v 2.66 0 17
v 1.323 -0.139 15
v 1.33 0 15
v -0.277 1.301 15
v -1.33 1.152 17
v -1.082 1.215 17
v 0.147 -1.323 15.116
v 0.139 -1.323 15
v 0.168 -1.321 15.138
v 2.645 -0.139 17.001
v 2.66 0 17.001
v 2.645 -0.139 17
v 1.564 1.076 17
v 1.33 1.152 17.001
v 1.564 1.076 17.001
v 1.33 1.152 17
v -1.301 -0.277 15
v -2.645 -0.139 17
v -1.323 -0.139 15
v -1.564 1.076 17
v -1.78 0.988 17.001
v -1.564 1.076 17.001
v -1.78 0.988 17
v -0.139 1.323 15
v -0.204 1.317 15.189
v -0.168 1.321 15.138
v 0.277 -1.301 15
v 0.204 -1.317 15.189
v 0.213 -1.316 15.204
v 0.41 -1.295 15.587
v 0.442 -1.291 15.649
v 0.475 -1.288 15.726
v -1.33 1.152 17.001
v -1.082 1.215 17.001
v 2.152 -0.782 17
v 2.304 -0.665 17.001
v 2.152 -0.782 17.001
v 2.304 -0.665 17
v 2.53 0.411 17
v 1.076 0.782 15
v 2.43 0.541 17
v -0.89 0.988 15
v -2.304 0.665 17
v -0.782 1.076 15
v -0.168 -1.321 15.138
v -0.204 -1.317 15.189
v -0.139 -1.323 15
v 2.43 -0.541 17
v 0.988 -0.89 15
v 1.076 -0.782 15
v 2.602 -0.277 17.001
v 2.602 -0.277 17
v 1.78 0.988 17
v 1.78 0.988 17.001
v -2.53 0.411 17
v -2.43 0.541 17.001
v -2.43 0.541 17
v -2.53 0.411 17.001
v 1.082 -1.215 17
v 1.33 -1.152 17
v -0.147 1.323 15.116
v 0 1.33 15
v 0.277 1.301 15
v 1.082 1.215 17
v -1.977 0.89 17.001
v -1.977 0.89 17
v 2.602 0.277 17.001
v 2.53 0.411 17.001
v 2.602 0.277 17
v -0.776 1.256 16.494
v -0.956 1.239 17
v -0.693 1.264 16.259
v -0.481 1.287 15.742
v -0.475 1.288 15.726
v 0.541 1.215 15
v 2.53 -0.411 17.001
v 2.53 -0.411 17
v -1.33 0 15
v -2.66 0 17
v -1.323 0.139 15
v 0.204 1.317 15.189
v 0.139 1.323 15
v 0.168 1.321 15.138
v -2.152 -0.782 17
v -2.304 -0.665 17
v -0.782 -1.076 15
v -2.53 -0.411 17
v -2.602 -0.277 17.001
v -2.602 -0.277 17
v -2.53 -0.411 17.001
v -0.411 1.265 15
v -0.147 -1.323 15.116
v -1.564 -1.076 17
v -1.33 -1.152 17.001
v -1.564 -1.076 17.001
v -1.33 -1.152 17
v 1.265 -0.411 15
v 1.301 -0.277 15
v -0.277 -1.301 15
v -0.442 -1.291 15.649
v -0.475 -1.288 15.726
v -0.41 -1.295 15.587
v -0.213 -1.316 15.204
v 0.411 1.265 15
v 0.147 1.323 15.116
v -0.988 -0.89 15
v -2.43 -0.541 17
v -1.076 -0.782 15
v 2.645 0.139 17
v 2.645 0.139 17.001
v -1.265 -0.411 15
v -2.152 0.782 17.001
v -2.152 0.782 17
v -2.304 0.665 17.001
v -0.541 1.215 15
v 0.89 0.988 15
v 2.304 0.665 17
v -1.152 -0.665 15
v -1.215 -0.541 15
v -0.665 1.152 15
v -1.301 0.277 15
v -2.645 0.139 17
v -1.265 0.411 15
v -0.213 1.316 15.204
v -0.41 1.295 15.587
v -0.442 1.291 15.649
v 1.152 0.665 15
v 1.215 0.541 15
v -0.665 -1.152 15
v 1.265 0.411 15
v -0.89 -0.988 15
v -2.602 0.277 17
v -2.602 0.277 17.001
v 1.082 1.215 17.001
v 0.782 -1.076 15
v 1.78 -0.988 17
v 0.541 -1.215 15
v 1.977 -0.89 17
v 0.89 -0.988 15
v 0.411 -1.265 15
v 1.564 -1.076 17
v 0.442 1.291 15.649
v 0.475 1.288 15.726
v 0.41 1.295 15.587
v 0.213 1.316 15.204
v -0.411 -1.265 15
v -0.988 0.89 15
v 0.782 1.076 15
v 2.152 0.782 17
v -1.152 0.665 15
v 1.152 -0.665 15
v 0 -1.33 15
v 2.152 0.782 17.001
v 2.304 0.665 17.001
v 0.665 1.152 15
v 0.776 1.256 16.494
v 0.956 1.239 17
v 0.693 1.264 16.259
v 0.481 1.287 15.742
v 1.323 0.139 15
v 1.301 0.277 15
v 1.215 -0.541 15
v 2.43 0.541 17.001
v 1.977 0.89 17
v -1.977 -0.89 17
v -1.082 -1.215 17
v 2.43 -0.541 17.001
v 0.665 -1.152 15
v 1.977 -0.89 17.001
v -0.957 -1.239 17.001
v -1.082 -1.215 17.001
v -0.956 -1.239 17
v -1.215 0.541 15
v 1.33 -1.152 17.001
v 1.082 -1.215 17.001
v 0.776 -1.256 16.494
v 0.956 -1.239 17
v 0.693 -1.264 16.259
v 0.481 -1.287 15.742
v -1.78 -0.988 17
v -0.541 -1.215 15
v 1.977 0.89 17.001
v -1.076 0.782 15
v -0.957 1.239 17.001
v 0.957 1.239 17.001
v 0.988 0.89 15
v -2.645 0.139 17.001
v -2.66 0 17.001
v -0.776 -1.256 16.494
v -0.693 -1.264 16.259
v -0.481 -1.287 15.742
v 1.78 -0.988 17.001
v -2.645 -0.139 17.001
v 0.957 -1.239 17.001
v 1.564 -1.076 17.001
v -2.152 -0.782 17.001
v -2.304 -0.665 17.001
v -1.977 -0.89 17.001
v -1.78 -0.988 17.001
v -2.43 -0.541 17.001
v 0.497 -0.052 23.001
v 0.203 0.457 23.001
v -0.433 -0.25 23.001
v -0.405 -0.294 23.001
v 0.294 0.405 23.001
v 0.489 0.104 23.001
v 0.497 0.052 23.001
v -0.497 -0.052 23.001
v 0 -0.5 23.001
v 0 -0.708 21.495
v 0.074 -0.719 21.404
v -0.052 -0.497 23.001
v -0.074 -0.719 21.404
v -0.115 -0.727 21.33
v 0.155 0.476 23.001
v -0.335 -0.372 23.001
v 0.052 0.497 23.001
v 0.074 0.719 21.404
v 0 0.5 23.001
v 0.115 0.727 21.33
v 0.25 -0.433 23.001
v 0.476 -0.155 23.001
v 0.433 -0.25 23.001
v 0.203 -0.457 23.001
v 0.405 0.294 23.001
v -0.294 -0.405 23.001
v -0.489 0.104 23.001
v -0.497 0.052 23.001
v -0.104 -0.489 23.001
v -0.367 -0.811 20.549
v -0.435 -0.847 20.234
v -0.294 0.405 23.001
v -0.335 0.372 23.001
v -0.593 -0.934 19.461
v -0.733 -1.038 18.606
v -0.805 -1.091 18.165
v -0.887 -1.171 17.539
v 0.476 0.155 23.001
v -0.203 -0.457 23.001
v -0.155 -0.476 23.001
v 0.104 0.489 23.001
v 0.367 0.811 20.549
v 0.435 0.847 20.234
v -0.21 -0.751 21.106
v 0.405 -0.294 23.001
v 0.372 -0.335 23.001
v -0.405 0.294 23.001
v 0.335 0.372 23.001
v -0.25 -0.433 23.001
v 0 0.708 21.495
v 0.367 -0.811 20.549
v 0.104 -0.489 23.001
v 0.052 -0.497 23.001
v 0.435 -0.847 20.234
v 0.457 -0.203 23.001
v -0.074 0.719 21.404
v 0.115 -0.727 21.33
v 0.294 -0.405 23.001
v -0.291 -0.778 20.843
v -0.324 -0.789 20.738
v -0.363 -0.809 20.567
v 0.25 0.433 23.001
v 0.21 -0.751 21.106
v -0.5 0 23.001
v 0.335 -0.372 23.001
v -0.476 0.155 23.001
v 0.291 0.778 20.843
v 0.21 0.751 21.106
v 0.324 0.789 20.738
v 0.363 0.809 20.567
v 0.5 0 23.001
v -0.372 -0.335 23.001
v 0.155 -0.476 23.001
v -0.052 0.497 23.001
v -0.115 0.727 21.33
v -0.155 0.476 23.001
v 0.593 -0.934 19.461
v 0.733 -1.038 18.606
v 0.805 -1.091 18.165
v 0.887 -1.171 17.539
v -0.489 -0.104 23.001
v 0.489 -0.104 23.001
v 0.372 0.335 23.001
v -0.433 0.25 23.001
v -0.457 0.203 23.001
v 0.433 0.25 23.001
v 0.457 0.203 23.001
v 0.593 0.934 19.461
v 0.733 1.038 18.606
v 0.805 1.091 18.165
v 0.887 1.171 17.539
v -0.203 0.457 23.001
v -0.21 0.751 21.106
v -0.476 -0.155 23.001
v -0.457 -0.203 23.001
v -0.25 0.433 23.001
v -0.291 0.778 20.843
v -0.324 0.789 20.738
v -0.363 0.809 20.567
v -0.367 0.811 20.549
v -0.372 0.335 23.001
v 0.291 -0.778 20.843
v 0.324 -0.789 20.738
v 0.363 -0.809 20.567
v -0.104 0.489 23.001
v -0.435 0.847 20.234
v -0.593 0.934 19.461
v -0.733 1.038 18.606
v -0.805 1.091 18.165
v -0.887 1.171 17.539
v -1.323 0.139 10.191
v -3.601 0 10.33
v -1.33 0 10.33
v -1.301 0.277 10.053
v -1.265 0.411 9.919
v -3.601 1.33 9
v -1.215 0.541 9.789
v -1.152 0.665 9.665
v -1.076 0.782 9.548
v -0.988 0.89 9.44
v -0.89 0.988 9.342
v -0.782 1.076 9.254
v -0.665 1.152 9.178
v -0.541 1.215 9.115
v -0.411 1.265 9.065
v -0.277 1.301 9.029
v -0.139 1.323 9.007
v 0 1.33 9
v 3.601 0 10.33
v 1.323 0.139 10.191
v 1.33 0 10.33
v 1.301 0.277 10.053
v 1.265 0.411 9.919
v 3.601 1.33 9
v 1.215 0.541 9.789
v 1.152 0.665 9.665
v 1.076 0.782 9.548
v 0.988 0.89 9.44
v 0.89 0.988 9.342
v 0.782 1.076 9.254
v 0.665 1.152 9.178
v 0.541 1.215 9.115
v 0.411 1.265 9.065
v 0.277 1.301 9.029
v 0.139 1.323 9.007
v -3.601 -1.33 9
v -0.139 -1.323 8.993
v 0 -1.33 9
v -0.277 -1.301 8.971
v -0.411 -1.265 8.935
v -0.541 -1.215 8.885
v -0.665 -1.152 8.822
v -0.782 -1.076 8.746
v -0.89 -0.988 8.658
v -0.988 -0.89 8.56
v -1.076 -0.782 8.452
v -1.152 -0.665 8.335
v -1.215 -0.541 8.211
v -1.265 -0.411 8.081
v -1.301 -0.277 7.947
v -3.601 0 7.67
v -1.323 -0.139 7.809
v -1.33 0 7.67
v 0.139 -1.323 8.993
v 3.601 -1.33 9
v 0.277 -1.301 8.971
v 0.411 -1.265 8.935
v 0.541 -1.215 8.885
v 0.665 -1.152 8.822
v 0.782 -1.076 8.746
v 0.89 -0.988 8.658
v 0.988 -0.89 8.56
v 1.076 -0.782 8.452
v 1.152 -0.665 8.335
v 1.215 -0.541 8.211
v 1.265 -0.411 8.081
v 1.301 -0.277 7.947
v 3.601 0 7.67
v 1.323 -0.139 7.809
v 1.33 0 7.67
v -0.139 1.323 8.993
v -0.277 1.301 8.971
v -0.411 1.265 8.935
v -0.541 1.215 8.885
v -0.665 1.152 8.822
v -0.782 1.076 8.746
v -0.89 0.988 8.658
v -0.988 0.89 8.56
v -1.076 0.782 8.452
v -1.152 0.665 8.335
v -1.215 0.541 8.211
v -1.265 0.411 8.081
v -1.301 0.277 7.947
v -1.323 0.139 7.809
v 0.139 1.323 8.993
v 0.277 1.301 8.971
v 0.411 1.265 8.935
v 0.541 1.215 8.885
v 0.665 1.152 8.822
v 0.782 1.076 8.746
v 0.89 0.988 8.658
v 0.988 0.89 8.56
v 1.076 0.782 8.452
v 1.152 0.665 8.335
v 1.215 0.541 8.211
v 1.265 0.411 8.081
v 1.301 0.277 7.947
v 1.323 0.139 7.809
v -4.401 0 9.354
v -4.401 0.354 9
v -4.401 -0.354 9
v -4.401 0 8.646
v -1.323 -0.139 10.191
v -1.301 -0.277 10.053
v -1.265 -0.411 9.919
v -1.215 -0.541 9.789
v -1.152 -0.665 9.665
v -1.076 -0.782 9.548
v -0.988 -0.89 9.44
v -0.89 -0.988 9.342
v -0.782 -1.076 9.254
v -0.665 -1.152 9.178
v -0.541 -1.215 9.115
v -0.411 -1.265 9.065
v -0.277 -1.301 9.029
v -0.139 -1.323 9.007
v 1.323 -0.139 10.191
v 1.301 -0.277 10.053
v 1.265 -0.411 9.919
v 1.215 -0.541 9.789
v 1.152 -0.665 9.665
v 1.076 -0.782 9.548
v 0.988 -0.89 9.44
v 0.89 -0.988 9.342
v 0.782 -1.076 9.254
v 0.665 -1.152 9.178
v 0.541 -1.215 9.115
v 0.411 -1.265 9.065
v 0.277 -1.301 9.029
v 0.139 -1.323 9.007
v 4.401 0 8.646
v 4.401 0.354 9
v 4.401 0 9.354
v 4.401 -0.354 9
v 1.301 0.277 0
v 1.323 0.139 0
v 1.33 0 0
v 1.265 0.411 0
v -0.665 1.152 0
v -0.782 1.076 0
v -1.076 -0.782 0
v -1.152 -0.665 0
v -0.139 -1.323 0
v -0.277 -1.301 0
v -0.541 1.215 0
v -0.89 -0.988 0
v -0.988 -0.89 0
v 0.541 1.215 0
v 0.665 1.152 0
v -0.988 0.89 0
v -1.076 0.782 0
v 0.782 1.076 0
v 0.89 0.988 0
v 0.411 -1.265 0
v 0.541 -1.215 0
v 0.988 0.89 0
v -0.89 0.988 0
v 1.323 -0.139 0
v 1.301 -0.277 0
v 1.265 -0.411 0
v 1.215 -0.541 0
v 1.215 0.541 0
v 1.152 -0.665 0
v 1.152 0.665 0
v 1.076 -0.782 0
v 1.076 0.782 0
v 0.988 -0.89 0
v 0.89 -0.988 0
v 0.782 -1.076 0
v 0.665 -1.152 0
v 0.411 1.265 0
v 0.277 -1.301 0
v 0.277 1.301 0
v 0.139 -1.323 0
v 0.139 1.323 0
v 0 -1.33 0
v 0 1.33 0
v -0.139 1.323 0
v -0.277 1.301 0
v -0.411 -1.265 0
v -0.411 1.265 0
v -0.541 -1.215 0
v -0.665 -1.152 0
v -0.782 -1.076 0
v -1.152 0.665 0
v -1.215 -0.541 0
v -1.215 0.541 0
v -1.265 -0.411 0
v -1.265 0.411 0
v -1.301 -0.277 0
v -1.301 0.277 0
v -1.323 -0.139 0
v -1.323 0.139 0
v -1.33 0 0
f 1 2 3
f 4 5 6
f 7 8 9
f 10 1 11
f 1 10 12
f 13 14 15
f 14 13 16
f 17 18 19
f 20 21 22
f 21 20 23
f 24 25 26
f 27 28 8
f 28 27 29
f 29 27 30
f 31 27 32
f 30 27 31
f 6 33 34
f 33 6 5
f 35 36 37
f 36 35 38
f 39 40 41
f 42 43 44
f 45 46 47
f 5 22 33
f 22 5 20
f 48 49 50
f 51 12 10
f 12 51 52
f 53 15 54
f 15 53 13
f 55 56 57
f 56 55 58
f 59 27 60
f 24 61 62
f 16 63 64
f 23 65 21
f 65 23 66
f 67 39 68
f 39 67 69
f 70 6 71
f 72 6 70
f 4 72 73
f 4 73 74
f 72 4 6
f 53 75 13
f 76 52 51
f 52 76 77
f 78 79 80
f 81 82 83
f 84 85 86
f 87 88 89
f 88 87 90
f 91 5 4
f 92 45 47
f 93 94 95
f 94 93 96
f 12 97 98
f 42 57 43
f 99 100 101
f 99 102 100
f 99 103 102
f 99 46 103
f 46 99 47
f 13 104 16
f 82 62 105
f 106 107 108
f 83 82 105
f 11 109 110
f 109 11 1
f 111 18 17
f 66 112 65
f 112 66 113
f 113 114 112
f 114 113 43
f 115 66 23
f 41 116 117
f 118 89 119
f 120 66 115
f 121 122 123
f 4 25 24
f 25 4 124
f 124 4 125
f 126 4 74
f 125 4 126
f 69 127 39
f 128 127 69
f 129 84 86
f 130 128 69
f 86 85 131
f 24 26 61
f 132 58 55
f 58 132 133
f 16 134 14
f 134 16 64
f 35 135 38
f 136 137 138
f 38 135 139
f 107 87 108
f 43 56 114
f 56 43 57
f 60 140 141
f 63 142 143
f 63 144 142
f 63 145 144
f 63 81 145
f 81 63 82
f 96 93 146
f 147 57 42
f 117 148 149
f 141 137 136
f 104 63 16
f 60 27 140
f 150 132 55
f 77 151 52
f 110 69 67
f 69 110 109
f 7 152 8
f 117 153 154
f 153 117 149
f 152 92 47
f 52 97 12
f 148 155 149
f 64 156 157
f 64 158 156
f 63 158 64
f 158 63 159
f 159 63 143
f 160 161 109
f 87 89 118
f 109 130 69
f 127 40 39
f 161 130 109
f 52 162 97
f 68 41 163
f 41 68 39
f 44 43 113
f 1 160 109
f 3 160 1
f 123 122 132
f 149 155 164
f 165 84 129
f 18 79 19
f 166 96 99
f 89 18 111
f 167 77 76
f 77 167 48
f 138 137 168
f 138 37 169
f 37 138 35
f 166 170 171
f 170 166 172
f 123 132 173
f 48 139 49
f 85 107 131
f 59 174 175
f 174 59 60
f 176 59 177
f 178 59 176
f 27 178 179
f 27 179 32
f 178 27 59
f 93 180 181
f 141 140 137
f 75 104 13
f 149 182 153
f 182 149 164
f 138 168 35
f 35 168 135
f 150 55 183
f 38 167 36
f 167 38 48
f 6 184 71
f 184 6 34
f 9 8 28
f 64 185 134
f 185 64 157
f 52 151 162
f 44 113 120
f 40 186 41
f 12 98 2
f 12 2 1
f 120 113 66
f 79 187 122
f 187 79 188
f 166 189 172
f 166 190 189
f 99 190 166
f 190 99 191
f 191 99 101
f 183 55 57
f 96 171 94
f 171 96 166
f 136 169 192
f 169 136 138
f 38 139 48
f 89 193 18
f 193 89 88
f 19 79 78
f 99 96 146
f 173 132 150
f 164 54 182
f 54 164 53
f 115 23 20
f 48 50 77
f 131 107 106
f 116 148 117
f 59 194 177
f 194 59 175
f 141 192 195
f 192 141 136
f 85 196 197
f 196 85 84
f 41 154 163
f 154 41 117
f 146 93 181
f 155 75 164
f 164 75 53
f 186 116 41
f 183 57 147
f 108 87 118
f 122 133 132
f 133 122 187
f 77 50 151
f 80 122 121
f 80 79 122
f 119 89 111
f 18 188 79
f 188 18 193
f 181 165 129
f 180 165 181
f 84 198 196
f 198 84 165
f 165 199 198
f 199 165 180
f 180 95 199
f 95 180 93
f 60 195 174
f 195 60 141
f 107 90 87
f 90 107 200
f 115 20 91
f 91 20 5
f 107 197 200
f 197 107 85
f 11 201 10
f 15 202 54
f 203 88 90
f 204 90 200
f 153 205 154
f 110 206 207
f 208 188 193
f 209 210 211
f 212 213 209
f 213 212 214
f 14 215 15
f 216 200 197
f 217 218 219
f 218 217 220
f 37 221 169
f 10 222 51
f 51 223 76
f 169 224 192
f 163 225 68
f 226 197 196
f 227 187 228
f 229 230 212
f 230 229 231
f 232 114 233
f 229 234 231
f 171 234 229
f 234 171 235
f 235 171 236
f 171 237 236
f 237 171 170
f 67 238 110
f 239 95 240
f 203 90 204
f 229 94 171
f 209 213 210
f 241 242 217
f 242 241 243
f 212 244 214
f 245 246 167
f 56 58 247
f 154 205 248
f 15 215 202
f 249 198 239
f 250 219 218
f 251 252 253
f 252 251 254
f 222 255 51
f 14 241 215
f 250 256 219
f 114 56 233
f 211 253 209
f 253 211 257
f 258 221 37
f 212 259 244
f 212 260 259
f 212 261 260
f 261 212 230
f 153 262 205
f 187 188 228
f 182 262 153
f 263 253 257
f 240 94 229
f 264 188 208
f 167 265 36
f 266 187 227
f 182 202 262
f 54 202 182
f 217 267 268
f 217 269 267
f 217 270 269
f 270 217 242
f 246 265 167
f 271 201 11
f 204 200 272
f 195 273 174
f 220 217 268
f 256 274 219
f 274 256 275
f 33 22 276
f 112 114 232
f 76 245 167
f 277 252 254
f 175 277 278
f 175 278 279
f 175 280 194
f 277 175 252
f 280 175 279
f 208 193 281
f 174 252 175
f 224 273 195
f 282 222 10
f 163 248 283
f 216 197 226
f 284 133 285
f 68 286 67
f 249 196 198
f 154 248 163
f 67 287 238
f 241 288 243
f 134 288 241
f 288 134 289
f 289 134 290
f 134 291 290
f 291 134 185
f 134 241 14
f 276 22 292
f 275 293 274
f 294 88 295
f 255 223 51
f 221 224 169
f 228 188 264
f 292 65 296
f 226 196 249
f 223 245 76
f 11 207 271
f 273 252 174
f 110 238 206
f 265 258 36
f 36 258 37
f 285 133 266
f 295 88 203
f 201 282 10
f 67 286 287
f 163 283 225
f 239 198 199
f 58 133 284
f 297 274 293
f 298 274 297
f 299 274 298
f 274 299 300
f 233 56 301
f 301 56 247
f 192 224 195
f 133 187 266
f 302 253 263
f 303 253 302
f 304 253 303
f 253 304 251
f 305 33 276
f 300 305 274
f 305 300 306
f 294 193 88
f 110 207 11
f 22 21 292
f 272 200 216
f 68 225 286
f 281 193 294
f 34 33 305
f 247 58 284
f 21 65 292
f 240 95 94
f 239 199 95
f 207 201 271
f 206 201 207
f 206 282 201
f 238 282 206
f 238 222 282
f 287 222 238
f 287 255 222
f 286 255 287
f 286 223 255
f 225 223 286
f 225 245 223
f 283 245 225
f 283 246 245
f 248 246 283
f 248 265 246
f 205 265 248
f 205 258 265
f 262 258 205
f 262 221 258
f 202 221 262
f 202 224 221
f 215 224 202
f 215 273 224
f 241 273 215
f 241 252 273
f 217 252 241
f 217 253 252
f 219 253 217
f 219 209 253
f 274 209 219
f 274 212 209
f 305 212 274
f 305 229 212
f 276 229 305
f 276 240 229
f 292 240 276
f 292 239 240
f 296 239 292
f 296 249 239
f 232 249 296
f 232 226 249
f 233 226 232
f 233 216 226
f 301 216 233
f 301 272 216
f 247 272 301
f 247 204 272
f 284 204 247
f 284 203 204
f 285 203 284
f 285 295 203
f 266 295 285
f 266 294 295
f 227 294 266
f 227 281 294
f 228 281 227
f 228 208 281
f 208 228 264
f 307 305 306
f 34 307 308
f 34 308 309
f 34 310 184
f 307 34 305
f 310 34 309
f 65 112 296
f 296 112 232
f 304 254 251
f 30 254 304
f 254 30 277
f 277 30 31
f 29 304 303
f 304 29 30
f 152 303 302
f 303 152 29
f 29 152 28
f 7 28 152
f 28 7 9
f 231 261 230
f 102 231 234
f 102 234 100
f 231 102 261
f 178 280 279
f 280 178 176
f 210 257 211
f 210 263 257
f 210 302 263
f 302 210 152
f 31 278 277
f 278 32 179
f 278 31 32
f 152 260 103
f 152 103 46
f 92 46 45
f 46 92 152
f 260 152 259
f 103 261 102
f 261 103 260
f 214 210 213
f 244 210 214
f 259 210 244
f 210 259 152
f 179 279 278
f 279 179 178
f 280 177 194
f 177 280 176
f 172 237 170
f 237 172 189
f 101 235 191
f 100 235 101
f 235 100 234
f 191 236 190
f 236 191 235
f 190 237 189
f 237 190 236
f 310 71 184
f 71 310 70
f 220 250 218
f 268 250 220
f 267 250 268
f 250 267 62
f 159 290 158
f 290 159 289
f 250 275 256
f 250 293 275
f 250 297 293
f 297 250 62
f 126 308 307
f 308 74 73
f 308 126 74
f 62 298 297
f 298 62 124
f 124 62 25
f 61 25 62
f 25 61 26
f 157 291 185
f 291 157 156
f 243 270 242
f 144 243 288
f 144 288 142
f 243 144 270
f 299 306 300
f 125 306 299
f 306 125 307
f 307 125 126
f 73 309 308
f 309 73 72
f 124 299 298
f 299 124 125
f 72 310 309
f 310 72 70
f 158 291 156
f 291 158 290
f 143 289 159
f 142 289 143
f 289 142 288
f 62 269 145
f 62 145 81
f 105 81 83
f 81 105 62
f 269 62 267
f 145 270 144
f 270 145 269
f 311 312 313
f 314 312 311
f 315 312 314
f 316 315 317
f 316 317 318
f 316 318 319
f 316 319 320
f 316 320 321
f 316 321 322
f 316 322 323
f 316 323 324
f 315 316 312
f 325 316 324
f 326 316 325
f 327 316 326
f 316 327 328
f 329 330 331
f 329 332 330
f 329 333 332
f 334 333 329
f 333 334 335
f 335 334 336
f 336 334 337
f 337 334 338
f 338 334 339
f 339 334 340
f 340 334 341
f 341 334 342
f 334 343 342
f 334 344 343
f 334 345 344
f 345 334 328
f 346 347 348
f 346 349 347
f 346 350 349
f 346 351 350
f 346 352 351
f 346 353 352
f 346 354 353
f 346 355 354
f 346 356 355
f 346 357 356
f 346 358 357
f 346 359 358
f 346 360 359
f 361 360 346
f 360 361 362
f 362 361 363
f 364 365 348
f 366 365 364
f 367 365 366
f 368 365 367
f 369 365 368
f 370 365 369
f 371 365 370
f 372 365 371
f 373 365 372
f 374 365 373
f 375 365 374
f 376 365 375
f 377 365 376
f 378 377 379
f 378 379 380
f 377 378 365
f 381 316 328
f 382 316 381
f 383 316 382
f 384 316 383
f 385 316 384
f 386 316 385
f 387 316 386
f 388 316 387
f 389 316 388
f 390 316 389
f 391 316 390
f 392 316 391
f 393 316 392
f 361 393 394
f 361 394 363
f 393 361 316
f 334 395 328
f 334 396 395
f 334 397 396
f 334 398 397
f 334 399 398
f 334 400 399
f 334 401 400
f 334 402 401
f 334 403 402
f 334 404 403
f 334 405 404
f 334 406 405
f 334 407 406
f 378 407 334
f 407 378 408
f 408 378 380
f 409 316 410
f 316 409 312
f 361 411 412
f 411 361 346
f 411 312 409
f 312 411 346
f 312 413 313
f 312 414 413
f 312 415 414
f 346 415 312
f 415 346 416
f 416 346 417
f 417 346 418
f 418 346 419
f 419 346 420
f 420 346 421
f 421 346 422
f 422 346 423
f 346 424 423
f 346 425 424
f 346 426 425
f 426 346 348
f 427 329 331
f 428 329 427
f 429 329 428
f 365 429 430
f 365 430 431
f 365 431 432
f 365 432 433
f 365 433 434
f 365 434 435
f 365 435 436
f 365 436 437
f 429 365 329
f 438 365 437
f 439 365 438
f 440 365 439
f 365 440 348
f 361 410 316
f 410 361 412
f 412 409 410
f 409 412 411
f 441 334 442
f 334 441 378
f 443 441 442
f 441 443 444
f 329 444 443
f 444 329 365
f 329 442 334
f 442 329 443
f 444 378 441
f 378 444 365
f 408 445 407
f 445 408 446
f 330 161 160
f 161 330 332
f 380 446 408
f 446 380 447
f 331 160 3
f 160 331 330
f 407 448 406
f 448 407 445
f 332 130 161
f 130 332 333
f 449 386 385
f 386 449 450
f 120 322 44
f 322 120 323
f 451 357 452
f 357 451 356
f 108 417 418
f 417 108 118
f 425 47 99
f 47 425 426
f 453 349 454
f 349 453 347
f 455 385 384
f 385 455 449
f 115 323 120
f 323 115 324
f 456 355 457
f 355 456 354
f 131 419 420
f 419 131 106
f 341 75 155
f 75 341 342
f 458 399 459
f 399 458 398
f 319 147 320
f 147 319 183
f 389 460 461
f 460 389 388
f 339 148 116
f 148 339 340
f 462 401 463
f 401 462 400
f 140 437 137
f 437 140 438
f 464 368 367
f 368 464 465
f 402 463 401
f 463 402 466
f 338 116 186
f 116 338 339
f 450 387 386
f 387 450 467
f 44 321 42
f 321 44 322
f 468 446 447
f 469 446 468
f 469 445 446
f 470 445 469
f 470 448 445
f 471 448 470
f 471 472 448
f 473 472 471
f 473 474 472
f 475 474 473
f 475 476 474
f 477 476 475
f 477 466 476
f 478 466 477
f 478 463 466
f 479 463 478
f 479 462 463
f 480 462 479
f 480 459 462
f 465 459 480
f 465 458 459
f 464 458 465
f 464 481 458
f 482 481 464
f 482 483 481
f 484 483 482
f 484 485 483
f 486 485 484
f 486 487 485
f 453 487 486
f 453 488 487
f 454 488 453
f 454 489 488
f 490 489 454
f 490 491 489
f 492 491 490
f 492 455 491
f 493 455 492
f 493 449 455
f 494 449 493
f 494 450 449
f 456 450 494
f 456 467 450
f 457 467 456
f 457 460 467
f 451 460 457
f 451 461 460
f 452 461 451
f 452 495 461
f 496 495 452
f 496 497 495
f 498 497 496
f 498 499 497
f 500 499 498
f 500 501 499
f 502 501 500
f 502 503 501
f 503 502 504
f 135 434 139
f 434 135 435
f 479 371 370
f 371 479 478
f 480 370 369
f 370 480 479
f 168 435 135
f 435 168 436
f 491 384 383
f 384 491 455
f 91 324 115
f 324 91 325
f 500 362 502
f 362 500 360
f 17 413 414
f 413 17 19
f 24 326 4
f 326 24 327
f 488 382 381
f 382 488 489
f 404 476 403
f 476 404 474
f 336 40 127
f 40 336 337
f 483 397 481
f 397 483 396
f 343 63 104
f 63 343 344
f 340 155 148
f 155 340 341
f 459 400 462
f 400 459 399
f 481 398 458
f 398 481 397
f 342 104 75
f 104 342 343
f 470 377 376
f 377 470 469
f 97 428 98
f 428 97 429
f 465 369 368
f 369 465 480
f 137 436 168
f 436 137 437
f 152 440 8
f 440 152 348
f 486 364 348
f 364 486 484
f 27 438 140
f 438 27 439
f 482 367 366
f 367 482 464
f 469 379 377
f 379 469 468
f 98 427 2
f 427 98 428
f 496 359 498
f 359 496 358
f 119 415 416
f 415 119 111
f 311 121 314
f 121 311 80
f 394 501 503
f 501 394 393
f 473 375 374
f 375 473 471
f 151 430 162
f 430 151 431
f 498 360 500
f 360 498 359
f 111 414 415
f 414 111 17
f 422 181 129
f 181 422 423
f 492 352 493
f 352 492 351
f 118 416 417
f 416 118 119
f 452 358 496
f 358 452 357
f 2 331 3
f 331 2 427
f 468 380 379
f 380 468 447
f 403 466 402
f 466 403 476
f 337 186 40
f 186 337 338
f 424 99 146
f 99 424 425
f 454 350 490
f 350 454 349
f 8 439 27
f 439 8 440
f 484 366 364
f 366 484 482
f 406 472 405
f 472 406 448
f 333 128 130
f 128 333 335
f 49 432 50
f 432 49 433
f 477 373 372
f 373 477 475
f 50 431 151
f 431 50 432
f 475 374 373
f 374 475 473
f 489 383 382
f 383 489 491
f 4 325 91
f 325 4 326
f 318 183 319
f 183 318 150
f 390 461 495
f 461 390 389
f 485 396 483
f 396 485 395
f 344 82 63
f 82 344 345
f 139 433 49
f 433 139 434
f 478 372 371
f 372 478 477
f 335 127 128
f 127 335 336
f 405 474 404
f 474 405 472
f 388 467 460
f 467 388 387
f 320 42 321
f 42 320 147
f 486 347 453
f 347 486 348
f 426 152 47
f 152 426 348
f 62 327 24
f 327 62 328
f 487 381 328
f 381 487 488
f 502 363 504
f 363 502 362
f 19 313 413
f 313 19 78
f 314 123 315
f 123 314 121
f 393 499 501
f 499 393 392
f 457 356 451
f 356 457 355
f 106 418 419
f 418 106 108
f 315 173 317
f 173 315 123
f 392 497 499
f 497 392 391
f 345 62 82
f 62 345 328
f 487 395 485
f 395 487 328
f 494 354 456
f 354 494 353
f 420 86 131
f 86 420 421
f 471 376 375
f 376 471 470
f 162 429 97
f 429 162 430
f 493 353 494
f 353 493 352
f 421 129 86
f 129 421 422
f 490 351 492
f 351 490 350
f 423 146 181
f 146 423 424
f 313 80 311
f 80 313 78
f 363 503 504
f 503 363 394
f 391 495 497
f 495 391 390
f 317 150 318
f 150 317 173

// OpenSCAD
$fn = 60;
shaft = 15;

cylinder(h=shaft, r=1.33);

translate([0, 0, shaft]) {
  difference() {
    union() {
      hull() {
        cylinder(h=0.001, r=1.33);
        translate([0, 0, 2])
          scale([2, 1, 1])
            cylinder(h=0.001, r=1.33);
      }
      hull() {
        translate([0, 0, 2])
          scale([2, 1, 1])
            cylinder(h=0.001, r=1.33);
        translate([0, 0, 8])
          cylinder(h=0.001, r=0.5);
      }
    }
    for (a = [-1, 1]) {
      scale([1, a, 1]) {
        translate([0, 2.33, 0]) {
          scale([2, 1, 1]) {
            hull() {
              cylinder(h=0.001, r=1);
              translate([0, 0, 7])
                cylinder(h=0.001, r=1.67);
            }
          }
        }
      }
    }
  }
}

translate([0, 0, 9]) {
  rotate([0, 90, 0]) {
    for (a = [-1, 1]) {
      scale([1, 1, a*0.8]) {
        hull() {
          linear_extrude(0.001) rotate([0, 0, 45]) square(1.33*sqrt(2), center=true);
          translate([0, 0, 4.5])
            linear_extrude(0.001) rotate([0, 0, 45]) square(1.33*sqrt(2), center=true);
          translate([0, 0, 5.5])
            linear_extrude(0.001) rotate([0, 0, 45]) square(0.5, center=true);
        }
      }
    }
  }
}
